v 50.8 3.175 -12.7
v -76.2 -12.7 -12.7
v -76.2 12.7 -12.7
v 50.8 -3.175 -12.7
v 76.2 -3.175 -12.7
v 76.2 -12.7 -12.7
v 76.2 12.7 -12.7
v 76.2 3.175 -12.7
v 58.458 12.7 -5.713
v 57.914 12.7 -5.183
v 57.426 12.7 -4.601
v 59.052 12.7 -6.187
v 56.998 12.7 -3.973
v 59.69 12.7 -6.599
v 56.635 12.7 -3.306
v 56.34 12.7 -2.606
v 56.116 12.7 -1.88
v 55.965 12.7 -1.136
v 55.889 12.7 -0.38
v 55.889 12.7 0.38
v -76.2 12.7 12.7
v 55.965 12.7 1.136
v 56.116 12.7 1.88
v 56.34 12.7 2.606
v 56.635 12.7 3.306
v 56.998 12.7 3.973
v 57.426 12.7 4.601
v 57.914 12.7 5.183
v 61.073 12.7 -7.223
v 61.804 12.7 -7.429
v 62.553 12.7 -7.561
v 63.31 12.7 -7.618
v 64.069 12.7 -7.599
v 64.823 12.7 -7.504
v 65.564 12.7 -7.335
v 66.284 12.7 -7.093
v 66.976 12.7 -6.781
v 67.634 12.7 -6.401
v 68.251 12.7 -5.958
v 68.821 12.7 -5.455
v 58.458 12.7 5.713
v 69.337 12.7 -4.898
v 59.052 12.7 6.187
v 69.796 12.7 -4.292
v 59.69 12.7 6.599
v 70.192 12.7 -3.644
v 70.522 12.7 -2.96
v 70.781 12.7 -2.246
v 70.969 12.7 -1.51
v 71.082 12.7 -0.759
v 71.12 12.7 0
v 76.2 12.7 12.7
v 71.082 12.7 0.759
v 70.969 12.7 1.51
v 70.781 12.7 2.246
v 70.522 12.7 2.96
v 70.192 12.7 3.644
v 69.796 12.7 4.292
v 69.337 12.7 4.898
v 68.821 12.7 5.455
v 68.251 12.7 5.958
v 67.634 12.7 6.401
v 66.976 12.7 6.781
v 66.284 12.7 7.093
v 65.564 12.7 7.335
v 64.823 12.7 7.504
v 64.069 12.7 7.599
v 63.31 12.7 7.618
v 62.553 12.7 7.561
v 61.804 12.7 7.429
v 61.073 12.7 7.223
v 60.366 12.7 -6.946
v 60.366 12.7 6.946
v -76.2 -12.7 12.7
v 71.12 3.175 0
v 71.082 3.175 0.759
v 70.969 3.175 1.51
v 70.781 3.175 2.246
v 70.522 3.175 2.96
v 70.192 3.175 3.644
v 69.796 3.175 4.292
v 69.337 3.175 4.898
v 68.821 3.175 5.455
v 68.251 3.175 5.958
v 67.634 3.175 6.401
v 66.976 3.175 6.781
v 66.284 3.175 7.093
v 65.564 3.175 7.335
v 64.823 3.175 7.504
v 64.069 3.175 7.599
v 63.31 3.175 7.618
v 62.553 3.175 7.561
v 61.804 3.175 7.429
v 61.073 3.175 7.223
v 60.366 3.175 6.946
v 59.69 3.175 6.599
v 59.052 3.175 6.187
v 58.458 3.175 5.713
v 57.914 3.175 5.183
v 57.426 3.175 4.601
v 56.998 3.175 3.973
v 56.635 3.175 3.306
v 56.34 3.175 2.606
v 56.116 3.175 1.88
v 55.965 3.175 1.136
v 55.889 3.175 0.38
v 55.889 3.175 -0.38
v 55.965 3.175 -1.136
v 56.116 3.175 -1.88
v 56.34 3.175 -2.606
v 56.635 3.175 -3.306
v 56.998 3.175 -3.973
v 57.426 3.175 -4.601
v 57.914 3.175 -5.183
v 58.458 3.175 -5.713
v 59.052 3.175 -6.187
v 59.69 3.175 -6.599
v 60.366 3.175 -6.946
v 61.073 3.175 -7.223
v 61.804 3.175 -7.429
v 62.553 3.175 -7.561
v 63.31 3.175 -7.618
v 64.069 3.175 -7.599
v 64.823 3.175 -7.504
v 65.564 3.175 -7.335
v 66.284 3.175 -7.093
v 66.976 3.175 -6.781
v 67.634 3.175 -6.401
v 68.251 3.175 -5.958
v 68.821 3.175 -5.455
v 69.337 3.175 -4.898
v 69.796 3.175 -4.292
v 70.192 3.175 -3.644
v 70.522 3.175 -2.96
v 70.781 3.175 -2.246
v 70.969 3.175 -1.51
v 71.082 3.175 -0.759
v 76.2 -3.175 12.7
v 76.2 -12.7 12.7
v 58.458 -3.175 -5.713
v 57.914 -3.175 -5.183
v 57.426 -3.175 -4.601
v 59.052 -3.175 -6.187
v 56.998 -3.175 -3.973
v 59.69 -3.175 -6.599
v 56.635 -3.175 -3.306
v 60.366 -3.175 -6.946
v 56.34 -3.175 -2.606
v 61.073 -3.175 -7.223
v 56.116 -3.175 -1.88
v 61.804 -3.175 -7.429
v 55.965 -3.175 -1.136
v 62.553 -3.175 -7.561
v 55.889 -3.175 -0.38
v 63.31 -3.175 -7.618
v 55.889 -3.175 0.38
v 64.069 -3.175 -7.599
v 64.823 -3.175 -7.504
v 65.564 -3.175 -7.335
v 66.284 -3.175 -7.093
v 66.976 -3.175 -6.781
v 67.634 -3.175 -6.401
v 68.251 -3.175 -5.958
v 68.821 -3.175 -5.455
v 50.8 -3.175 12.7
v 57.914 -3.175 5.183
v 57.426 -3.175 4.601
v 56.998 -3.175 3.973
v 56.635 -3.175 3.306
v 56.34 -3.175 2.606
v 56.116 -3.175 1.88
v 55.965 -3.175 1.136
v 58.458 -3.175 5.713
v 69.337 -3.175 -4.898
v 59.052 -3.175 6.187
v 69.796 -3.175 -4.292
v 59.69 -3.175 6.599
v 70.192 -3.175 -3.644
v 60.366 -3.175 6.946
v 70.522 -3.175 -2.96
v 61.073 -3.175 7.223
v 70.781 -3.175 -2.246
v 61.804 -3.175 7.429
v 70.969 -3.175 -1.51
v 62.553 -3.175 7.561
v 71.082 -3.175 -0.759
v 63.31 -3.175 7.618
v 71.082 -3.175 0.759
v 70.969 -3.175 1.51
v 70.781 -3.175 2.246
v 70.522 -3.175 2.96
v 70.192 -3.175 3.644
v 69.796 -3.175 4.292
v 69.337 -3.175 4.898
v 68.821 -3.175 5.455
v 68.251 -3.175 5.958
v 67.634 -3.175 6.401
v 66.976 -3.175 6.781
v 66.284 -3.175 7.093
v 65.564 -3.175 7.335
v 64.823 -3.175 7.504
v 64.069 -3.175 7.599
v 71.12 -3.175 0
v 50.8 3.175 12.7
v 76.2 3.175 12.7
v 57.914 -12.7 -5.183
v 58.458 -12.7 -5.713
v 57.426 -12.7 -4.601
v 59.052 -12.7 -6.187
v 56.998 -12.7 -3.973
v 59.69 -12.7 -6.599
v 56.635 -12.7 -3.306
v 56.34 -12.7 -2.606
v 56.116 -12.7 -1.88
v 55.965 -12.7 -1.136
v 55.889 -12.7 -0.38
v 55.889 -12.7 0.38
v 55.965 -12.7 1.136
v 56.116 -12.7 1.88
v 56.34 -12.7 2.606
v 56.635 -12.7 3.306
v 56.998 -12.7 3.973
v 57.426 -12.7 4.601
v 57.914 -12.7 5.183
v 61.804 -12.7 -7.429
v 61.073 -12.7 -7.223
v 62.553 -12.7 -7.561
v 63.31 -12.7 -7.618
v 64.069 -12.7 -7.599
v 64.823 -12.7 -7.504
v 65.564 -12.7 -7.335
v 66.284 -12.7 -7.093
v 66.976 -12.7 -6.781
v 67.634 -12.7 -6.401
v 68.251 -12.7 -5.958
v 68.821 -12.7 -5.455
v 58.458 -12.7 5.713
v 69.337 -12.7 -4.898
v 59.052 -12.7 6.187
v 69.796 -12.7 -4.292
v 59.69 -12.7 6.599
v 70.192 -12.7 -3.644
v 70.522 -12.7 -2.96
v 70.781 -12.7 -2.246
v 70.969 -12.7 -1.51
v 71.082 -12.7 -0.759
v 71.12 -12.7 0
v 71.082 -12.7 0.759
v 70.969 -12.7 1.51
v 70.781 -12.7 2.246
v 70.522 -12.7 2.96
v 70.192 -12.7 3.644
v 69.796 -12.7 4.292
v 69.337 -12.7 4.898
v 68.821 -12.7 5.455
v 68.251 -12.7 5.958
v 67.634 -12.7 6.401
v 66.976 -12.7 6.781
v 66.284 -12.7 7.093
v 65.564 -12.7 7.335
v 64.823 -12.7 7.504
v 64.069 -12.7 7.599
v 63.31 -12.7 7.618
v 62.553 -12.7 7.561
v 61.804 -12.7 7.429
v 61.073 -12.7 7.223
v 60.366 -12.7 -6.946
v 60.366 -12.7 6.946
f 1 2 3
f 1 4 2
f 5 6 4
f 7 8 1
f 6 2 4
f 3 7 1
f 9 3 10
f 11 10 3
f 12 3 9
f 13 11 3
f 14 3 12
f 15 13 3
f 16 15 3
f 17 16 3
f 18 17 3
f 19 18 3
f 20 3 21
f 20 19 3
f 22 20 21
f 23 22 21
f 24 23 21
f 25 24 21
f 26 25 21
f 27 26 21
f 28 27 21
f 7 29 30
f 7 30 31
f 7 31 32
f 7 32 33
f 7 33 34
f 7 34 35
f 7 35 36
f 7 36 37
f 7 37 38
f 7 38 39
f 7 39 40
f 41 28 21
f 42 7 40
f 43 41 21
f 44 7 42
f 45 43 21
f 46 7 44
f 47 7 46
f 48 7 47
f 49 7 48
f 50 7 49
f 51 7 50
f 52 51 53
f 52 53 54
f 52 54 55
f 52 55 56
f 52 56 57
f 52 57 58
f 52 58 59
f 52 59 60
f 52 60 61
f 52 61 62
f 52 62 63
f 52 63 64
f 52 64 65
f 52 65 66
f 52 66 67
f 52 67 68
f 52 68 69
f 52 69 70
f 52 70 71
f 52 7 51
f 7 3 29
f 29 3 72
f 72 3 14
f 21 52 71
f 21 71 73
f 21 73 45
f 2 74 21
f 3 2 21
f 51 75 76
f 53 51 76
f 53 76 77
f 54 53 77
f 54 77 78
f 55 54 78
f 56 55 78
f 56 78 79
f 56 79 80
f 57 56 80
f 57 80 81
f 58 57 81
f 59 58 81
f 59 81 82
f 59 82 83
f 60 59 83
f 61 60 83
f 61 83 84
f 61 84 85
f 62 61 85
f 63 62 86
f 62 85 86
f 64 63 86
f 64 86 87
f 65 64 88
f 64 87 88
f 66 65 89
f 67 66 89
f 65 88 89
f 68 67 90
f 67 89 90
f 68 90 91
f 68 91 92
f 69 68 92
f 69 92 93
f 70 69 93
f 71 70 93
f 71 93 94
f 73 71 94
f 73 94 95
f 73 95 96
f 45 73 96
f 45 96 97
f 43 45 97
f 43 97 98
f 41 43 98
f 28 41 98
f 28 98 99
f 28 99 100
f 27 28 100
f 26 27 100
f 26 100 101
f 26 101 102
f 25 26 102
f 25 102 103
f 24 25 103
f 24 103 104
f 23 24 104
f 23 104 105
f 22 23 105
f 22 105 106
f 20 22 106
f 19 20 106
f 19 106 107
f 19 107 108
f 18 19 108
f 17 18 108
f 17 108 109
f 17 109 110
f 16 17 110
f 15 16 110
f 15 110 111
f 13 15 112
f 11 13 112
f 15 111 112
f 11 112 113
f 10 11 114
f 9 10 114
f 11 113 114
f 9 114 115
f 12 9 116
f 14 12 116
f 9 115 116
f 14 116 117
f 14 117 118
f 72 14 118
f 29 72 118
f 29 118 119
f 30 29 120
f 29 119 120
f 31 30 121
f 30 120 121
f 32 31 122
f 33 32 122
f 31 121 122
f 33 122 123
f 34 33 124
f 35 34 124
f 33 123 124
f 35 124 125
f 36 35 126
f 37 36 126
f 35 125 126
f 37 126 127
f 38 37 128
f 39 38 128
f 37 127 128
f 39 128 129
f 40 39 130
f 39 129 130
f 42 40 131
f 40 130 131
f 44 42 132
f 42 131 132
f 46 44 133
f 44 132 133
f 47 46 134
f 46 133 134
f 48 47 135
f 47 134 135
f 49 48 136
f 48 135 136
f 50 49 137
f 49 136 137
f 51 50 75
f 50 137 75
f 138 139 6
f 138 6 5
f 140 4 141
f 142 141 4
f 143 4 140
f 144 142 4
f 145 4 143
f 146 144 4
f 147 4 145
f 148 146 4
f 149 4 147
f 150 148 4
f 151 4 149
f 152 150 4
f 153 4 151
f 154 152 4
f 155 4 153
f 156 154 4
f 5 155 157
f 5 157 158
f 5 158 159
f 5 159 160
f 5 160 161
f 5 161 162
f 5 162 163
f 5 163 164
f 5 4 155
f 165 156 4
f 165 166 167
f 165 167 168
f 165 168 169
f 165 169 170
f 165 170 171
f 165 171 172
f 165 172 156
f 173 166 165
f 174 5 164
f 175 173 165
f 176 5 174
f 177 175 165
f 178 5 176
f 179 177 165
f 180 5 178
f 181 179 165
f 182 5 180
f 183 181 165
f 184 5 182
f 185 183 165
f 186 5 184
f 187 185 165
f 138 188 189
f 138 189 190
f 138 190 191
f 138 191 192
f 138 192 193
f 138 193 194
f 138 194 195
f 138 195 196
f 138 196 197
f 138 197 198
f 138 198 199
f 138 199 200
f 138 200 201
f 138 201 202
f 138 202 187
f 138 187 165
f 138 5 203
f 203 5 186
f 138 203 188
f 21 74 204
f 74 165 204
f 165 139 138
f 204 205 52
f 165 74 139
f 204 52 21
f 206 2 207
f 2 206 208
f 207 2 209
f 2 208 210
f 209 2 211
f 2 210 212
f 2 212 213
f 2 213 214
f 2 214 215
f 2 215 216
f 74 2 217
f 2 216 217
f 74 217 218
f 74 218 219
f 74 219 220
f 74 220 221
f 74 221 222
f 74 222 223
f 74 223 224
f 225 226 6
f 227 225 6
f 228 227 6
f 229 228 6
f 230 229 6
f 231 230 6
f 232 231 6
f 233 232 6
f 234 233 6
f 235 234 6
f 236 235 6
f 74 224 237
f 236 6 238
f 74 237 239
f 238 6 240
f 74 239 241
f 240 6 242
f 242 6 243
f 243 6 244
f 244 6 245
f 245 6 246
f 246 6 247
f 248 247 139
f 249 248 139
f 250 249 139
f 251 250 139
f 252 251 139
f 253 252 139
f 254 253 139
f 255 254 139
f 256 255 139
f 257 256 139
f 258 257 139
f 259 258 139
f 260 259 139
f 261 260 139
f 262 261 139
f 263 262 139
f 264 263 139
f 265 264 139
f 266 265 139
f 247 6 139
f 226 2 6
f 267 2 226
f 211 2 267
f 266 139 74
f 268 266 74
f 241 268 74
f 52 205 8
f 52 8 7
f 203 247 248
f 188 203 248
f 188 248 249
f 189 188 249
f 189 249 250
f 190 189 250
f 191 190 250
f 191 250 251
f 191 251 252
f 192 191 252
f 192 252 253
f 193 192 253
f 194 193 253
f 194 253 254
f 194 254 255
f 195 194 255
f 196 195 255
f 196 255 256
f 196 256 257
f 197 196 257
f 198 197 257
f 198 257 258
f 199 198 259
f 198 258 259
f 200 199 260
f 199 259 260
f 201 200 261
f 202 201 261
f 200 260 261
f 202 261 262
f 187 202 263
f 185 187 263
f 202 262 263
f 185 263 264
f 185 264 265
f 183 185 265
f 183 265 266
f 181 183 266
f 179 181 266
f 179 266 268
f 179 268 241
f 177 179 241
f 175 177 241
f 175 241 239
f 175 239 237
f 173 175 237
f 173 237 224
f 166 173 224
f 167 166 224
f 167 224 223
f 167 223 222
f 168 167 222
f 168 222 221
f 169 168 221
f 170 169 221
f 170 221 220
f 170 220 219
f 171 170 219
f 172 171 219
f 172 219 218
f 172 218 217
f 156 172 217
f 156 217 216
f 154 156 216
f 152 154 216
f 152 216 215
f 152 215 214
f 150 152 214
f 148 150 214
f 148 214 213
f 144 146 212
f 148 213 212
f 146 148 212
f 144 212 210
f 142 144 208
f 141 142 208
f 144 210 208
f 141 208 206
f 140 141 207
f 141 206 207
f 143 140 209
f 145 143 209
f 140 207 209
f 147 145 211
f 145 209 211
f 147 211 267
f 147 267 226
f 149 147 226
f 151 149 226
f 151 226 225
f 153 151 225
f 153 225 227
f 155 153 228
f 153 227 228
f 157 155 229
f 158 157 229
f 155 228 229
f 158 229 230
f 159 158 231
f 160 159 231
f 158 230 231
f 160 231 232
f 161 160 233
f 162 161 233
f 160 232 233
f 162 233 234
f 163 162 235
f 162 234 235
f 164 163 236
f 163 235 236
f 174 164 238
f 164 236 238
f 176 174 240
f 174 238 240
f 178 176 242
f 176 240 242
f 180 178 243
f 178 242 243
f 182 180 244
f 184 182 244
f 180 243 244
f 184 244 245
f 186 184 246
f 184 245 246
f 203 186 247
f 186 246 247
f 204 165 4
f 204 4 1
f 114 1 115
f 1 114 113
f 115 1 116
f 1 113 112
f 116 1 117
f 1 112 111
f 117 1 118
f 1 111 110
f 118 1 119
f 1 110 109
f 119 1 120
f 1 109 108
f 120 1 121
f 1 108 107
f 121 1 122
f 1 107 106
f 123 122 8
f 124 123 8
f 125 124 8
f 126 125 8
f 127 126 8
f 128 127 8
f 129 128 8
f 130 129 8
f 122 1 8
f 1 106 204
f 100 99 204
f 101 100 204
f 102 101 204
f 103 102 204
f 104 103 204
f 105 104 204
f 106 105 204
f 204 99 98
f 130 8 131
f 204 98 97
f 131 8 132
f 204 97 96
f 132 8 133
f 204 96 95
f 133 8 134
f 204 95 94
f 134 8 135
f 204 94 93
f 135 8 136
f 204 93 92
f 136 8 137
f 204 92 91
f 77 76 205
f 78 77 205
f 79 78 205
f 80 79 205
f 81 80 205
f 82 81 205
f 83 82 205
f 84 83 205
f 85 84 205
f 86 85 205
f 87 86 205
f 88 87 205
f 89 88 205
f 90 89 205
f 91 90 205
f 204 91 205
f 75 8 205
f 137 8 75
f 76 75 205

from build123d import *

# Parameters (mm, degrees)
F0_W     = 25.4
F0_H     = 25.4
F1_DEPTH = 76.2
F2_R     = 7.62
F3_DEPTH = 25.4
F4_W     = 6.35
F4_H     = 25.4
F5_DEPTH = 25.4


with BuildPart() as f1:
    # F0 (on Right) → F1 (new body, symmetric)
    with BuildSketch(Plane.YZ):
        Rectangle(F0_W, F0_H)
    extrude(amount=F1_DEPTH, both=True)

    # F2 (on face) → F3 (cut, through all)
    with BuildSketch(Plane.XZ.offset(12.7)):
        with Locations((63.5, 0)):
            Circle(F2_R)
    extrude(amount=-F3_DEPTH, mode=Mode.SUBTRACT)

    # F4 (on face) → F5 (cut)
    with BuildSketch(Plane.YZ.offset(76.2)):
        Rectangle(F4_W, F4_H)
    extrude(amount=-F5_DEPTH, mode=Mode.SUBTRACT)


solid = f1.part
